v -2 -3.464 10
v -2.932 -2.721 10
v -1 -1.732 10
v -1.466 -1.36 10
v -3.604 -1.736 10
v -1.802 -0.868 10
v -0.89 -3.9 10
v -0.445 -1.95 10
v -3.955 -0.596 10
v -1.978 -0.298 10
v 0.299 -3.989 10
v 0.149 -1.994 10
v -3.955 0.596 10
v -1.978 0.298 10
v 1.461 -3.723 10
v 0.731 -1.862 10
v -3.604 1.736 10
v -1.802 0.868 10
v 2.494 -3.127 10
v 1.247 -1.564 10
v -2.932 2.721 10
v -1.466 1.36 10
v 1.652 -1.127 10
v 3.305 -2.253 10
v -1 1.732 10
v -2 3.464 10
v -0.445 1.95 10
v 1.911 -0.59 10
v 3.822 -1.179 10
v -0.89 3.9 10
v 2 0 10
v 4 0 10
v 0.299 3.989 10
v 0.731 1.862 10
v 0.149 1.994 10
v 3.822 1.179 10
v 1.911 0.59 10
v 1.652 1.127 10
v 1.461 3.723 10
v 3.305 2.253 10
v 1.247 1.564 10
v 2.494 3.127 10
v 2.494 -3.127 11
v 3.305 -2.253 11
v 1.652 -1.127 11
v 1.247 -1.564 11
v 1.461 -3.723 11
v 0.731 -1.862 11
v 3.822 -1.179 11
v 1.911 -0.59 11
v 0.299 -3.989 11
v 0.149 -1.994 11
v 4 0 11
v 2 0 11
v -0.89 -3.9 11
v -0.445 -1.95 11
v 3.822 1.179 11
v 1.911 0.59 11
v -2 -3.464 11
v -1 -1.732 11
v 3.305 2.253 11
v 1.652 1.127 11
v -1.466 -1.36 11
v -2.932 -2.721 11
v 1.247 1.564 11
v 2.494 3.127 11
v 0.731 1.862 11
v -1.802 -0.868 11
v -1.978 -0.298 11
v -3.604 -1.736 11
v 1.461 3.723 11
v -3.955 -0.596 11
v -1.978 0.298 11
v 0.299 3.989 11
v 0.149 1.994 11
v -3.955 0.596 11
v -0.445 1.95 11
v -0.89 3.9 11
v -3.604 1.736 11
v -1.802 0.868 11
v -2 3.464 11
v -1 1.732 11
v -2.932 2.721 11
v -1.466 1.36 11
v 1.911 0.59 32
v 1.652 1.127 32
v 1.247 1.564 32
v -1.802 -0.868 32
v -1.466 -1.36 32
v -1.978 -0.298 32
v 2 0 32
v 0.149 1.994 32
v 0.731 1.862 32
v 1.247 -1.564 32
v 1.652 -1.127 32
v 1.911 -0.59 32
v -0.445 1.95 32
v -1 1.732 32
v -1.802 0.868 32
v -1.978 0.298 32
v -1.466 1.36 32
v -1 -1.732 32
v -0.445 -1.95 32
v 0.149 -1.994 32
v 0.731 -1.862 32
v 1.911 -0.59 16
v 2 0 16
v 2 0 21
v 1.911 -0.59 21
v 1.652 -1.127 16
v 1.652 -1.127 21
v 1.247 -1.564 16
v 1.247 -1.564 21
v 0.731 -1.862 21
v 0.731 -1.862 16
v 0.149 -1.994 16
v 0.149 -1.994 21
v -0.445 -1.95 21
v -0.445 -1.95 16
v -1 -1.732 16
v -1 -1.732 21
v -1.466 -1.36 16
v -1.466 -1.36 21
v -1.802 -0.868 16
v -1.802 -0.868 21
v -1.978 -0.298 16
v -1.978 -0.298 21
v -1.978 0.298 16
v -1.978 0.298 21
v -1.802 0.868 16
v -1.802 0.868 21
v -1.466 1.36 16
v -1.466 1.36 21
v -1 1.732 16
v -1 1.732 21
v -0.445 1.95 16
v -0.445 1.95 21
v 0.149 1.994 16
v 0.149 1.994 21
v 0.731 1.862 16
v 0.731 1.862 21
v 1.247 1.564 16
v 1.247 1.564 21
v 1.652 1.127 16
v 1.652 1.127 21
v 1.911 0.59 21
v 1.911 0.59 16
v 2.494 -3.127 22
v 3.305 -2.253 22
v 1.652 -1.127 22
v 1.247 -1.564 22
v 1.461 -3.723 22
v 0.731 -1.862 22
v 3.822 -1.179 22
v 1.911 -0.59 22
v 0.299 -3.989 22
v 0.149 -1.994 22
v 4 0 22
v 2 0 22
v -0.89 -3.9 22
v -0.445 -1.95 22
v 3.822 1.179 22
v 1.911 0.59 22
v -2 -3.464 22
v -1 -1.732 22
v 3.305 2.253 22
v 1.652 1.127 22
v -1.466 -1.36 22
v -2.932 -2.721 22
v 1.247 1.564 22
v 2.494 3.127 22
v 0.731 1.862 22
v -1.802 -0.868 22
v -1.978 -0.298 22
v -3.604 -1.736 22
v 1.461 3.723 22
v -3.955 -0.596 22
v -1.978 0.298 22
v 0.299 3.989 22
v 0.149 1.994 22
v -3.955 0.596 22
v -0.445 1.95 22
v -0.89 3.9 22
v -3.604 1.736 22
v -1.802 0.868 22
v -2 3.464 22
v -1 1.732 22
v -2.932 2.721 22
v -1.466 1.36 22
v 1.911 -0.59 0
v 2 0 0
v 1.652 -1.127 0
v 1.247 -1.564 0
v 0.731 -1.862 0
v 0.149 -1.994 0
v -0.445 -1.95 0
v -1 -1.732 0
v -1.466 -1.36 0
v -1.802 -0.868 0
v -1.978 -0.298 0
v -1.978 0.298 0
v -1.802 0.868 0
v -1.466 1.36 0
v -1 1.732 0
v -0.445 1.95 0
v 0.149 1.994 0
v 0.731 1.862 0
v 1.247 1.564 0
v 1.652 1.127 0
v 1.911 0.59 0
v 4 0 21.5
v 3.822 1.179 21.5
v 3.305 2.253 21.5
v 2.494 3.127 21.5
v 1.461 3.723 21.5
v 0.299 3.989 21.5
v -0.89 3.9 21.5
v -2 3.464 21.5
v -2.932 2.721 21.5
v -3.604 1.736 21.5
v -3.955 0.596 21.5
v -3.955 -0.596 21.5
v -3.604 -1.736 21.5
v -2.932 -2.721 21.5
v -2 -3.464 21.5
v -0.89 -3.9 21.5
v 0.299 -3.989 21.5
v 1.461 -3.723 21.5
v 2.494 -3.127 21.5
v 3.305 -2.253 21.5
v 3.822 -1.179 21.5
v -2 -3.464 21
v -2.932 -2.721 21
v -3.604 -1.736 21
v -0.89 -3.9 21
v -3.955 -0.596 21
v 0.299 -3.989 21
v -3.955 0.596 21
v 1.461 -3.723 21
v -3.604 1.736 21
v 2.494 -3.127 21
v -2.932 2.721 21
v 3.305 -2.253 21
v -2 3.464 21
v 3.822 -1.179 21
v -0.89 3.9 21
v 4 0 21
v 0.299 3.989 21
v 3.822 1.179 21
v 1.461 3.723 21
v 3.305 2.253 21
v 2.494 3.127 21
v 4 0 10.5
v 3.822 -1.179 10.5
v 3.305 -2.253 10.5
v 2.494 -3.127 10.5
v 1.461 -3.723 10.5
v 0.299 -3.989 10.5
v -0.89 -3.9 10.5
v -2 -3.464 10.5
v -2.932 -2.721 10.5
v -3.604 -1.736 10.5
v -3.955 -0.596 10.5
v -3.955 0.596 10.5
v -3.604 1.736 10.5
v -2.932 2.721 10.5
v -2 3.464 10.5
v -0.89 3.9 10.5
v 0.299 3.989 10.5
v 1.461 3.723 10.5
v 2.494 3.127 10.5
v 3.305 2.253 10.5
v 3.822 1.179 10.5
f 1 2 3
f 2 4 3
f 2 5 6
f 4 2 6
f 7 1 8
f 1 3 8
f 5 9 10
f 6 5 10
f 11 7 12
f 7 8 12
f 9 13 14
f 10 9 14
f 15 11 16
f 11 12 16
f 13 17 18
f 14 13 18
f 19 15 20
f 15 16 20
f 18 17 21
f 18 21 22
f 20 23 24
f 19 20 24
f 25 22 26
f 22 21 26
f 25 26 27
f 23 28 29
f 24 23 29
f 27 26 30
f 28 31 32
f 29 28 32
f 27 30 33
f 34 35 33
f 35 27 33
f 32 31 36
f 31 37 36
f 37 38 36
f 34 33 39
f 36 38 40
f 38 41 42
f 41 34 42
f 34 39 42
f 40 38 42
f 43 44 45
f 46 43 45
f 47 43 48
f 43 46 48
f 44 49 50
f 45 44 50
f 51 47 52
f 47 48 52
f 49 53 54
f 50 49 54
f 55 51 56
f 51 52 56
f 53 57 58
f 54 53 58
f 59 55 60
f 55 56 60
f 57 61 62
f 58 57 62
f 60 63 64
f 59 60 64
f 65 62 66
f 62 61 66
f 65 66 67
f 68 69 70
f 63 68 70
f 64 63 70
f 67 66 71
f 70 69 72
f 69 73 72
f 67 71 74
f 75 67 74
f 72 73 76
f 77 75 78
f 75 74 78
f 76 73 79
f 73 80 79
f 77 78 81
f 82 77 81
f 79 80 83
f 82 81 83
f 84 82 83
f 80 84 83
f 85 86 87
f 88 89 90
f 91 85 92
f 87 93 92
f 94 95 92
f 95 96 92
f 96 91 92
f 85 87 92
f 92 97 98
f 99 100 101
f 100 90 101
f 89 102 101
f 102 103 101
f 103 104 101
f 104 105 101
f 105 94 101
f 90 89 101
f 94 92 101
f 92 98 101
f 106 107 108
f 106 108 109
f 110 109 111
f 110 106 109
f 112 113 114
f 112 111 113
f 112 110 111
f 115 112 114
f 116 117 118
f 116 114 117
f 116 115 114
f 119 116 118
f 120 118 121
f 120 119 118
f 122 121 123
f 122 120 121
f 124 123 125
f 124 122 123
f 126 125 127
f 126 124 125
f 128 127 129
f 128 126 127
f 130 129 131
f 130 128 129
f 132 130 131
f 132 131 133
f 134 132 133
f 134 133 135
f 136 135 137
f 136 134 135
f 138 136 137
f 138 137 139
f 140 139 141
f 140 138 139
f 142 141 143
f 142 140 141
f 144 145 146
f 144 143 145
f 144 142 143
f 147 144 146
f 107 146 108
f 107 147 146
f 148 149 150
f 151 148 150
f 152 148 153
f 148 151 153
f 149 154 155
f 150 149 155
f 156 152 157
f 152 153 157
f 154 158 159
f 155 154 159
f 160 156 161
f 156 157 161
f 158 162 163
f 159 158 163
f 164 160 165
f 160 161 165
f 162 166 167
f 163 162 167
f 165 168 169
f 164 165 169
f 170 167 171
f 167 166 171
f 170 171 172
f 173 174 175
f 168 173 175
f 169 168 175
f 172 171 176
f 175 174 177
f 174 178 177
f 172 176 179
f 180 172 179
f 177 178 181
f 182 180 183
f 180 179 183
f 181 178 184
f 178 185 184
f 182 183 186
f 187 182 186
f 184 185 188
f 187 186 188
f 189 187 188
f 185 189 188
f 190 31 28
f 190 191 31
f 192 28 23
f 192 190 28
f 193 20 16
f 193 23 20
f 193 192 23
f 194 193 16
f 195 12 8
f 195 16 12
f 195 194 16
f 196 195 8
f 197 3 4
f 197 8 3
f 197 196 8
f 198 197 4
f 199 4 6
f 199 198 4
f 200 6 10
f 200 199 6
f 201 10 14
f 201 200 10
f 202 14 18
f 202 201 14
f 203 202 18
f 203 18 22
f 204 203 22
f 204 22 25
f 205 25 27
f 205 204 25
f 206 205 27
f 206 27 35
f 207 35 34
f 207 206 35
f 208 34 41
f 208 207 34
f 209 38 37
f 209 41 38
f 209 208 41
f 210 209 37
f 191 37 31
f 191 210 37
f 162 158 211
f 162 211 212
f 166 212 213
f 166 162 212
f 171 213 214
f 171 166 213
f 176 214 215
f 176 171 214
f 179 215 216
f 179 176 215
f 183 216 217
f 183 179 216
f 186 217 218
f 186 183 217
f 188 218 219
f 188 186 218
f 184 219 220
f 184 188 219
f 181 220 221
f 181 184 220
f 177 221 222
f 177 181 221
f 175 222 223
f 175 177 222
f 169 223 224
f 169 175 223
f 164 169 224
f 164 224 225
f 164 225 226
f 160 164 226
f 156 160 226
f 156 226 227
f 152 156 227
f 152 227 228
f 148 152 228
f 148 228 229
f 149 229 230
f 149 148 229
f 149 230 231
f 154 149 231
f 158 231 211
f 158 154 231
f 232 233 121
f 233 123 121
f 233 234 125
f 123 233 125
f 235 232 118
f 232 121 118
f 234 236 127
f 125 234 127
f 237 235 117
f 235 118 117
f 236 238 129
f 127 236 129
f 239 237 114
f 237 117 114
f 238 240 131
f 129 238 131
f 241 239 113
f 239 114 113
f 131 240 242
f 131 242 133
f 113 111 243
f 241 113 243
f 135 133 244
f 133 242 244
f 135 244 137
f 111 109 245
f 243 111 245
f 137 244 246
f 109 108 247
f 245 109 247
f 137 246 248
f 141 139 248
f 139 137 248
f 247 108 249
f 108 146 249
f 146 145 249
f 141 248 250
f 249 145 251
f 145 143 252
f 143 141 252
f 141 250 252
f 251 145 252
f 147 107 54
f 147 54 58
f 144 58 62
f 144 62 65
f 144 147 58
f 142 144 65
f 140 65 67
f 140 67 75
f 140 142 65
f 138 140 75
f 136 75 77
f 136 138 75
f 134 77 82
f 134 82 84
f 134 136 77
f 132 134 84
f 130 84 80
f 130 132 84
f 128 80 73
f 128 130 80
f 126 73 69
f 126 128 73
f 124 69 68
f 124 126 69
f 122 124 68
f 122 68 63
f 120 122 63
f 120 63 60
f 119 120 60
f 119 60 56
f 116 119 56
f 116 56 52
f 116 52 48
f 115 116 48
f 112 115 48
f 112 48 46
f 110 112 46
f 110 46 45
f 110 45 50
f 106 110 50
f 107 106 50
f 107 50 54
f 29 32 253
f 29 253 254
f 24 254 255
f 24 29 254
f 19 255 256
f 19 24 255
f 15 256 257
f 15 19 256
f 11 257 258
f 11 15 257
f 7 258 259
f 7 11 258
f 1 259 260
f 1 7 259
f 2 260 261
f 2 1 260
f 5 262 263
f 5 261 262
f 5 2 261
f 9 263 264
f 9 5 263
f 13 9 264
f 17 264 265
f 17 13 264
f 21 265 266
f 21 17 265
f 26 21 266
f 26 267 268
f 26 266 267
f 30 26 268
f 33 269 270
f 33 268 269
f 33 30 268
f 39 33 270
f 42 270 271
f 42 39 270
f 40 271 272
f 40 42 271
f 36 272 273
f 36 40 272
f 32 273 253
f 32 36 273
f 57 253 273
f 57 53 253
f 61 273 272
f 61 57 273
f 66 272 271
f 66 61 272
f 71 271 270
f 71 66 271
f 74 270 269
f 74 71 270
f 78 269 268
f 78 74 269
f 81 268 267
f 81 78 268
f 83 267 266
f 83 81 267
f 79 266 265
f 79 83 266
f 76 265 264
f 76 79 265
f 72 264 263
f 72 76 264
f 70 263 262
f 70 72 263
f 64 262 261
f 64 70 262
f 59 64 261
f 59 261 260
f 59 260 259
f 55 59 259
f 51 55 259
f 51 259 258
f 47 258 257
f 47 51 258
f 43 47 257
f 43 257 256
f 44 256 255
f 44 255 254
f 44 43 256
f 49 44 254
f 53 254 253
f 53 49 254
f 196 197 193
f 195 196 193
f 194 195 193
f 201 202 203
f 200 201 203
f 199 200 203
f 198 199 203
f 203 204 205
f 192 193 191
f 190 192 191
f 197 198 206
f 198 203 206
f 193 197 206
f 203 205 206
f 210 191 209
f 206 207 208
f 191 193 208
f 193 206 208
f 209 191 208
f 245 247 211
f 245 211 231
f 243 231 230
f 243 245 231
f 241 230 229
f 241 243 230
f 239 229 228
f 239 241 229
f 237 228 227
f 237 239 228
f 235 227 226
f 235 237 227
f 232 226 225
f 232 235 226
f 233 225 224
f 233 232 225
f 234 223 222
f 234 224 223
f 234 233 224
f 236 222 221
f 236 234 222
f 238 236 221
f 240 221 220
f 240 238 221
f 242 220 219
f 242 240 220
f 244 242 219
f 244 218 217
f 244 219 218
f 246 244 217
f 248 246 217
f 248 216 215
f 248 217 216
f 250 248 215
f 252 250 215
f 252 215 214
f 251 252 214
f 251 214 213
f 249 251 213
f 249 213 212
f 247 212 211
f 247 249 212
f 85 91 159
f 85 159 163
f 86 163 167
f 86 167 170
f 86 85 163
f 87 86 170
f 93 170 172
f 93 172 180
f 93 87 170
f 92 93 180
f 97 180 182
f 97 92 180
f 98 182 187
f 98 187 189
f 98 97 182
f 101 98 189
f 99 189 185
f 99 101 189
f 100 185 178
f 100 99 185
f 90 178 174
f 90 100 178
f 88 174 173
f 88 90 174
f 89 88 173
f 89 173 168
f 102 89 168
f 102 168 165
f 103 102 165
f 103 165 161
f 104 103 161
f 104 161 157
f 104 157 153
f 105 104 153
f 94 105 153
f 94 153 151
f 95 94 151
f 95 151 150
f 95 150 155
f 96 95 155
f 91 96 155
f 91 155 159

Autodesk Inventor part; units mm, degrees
ref_plane "YZ Plane" through (0, 0, 0) normal (1, 0, 0) x (0, 1, 0)
ref_plane "XZ Plane" through (0, 0, 0) normal (0, 1, 0) x (-1, 0, 0)
ref_plane "XY Plane" through (0, 0, 0) normal (0, 0, 1) x (1, 0, 0)
sketch "Эскиз1" plane through (0, 0, 0) normal (0, 0, 1) x (1, 0, 0)
  circle A0 centre (0, 0) radius 2
  dimension "d0" = 4
extrude "Выдавливание1" add sketch "Эскиз1" along normal blind 10
sketch "Эскиз2" plane through (0, 0, 10) normal (0, 0, 1) x (1, 0, 0)
  circle A0 centre (0, 0) radius 4
  dimension "d5" = 8
extrude "Выдавливание2" add sketch "Эскиз2" along normal blind 0.5
mirror "Зеркальное отражение1" about plane through (0, 0, 10.5) normal (0, 0, 1) of "Выдавливание2", "Выдавливание1"
sketch "Эскиз3" plane through (0, 0, 21) normal (0, 0, 1) x (1, 0, 0)
  circle A0 centre (-7.3376, 4.7247) radius 20.8096
  point P0 (0, 0)
extrude "Выдавливание3" cut sketch "Эскиз3" against normal blind 5
mirror "Зеркальное отражение3" about plane through (-7.3376, 4.7247, 16) normal (0, 0, 1)
thread "Резьба4" size "M4x0.7" class "6g" standard "ANSI Metric M Profile" full length
properties part number "ось крепление пушки" material "Железо, ковкое"
